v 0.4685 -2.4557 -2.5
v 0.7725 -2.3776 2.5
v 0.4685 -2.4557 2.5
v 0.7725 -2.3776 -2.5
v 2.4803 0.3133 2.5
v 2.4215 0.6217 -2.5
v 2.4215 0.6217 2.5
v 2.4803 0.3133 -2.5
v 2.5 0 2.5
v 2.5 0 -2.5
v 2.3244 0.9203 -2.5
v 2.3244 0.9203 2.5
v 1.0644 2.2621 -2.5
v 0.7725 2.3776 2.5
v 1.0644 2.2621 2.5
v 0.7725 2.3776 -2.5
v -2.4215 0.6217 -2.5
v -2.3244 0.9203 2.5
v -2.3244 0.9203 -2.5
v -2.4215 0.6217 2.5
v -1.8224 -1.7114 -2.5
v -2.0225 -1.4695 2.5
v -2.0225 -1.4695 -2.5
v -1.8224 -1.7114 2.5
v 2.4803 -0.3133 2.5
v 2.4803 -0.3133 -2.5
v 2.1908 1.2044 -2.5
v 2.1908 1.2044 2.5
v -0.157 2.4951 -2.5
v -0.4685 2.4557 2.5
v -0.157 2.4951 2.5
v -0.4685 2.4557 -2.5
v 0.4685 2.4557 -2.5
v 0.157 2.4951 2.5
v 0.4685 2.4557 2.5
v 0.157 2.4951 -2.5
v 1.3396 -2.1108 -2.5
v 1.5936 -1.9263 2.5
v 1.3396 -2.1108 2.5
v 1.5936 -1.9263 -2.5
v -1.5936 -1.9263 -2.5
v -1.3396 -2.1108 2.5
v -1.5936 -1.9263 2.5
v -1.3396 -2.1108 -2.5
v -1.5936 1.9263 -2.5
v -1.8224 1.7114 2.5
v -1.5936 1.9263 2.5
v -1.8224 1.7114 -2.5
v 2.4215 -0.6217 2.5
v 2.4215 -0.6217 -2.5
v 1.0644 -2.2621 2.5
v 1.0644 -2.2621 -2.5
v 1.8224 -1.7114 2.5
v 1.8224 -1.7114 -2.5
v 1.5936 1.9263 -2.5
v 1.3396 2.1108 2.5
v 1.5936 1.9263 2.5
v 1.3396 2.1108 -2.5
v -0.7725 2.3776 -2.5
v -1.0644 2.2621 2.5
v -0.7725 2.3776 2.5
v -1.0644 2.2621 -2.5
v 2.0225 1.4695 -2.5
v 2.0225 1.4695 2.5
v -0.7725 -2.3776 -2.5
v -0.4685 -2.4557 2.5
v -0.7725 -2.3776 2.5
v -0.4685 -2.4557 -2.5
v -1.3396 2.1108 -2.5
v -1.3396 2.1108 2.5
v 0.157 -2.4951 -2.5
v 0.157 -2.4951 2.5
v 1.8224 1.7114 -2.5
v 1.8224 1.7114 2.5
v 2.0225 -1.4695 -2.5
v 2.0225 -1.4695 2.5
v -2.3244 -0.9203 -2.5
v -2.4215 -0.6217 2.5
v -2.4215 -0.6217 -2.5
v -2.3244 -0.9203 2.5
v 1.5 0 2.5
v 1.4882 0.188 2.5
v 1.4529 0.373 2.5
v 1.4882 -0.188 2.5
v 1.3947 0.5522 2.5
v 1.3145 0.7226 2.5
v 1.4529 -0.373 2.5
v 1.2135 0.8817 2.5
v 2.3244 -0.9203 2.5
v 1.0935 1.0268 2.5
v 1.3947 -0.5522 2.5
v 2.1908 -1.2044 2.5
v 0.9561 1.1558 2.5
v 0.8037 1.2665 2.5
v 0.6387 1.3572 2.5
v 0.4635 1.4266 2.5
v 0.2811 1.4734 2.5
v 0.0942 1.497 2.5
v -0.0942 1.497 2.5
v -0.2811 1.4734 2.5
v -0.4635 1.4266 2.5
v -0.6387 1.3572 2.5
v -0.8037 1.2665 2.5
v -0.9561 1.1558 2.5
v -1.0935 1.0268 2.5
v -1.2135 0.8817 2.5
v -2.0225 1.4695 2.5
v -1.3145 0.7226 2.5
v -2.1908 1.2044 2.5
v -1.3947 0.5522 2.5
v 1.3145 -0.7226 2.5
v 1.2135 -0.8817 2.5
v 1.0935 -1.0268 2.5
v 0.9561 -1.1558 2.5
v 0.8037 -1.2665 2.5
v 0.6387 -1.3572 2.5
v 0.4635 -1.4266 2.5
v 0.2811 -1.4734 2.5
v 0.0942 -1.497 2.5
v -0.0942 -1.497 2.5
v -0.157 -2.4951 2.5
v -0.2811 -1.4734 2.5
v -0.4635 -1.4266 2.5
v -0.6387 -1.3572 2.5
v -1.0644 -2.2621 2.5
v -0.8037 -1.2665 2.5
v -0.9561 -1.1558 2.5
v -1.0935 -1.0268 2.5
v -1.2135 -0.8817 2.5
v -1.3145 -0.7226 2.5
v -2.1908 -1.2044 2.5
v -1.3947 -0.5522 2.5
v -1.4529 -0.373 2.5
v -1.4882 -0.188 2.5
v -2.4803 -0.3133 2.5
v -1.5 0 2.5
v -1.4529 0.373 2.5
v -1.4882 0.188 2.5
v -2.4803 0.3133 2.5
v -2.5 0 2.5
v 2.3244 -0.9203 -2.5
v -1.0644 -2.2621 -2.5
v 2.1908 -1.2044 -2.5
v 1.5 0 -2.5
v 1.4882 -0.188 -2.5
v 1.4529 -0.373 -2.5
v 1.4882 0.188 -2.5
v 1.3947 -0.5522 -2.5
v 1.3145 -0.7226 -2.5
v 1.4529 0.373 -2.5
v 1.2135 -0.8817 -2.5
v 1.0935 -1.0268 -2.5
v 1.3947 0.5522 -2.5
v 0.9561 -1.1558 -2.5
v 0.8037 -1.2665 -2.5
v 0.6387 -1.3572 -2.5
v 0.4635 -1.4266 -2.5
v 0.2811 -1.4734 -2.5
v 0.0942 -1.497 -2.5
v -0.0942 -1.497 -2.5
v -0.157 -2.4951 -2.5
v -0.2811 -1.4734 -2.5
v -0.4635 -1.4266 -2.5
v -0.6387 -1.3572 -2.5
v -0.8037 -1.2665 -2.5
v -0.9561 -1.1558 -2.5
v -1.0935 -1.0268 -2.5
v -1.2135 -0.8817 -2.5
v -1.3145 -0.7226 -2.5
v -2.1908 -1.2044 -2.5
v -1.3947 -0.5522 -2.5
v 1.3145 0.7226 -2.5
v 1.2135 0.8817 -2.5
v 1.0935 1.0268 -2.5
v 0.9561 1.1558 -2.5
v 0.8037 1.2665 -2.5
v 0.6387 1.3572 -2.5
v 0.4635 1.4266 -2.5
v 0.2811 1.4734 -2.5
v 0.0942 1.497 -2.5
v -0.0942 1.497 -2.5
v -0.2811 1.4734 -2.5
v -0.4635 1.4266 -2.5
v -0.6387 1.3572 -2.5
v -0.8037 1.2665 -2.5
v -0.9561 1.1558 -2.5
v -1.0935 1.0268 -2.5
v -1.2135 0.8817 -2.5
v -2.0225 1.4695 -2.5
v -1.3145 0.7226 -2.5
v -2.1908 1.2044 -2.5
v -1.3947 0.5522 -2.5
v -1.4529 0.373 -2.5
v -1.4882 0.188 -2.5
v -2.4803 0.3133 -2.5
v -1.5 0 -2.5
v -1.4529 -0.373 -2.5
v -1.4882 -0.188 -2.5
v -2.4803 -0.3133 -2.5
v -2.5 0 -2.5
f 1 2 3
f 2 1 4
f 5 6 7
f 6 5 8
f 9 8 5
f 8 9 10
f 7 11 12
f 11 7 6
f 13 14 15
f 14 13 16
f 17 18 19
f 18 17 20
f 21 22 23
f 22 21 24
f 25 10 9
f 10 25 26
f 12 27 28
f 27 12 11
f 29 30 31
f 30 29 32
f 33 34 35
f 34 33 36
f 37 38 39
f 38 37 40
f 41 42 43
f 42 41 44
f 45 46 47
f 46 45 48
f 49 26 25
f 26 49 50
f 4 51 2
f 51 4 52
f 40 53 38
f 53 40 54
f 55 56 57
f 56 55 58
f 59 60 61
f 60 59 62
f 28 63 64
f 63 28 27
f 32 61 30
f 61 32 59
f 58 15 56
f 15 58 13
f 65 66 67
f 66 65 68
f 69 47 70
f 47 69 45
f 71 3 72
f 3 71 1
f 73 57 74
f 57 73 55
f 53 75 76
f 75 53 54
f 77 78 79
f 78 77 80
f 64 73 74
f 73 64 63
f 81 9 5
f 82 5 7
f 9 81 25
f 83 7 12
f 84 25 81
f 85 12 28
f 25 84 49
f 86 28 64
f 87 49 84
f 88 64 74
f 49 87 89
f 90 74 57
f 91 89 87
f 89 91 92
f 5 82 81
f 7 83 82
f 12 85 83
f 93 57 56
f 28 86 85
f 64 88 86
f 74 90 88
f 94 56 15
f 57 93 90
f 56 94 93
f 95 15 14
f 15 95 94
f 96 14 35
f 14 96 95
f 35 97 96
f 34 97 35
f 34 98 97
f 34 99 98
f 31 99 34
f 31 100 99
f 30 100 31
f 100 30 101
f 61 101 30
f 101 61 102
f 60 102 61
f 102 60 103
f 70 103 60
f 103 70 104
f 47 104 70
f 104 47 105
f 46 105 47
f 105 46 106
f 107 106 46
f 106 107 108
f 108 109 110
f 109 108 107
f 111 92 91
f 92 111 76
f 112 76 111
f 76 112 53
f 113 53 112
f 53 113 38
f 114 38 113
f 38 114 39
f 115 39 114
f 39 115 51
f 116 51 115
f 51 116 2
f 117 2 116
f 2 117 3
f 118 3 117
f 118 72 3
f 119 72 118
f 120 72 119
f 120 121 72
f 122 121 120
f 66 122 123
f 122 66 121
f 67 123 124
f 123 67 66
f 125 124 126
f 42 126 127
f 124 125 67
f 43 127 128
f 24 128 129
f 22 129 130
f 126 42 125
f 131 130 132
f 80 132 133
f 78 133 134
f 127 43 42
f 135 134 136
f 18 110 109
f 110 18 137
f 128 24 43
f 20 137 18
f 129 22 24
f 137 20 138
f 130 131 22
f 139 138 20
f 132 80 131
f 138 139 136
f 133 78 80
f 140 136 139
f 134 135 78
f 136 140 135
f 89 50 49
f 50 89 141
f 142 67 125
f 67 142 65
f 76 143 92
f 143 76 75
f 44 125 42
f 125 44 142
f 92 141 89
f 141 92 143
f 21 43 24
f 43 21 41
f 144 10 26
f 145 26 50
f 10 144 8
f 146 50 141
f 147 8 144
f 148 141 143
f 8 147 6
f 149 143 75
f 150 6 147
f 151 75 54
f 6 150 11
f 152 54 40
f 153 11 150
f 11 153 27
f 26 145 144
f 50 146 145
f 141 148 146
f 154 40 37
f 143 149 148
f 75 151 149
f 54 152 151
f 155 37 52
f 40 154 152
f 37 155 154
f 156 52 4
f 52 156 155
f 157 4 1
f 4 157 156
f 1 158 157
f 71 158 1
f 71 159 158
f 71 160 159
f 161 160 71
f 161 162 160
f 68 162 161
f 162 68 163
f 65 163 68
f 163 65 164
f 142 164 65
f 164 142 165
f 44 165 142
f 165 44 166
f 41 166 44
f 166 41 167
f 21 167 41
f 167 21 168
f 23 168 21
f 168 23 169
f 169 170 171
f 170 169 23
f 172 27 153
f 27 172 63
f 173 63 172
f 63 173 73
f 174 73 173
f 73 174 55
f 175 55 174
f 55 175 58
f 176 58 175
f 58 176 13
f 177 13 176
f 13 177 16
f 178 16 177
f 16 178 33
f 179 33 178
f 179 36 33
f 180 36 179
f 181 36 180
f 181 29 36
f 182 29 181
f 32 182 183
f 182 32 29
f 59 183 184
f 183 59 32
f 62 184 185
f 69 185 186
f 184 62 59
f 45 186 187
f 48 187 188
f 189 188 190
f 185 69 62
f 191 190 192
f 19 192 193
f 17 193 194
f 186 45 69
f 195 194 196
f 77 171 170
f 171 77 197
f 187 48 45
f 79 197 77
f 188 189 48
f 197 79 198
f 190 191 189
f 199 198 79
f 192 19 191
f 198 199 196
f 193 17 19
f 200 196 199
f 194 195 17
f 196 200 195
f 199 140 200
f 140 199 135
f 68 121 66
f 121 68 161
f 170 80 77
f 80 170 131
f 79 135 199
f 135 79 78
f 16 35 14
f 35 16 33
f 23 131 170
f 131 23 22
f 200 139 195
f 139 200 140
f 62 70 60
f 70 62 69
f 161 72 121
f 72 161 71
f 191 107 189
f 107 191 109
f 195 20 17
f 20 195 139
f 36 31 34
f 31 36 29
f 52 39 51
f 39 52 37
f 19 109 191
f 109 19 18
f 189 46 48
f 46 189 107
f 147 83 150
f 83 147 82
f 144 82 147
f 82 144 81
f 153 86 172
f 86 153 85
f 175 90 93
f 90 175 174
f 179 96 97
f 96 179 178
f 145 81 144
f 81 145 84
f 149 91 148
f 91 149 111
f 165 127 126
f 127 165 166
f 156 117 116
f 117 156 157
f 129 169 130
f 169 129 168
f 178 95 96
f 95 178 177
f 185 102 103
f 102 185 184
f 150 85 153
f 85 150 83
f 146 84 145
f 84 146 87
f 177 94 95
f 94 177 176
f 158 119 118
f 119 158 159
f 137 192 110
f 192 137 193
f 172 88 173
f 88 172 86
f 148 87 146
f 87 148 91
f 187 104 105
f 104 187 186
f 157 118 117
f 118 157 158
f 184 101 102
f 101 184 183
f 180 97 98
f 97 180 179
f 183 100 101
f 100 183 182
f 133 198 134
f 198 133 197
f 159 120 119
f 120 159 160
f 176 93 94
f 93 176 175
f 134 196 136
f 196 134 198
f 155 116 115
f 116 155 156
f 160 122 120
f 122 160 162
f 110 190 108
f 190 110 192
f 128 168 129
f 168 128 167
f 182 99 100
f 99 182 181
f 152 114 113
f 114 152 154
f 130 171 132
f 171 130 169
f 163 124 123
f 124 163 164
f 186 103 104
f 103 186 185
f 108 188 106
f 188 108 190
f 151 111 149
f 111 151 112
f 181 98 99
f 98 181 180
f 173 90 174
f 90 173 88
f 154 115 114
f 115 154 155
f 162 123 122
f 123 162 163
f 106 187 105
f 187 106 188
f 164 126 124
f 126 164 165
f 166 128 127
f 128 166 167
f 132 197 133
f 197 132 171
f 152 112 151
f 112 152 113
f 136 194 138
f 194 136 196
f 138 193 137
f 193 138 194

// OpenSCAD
$fn = 50;


difference() {
	union() {
		translate(v = [0, 0, -2.5000000000]) {
			cylinder(h = 5, r = 2.5000000000);
		}
	}
	union() {
		translate(v = [0, 0, -100.0000000000]) {
			cylinder(h = 200, r = 1.5000000000);
		}
	}
}
